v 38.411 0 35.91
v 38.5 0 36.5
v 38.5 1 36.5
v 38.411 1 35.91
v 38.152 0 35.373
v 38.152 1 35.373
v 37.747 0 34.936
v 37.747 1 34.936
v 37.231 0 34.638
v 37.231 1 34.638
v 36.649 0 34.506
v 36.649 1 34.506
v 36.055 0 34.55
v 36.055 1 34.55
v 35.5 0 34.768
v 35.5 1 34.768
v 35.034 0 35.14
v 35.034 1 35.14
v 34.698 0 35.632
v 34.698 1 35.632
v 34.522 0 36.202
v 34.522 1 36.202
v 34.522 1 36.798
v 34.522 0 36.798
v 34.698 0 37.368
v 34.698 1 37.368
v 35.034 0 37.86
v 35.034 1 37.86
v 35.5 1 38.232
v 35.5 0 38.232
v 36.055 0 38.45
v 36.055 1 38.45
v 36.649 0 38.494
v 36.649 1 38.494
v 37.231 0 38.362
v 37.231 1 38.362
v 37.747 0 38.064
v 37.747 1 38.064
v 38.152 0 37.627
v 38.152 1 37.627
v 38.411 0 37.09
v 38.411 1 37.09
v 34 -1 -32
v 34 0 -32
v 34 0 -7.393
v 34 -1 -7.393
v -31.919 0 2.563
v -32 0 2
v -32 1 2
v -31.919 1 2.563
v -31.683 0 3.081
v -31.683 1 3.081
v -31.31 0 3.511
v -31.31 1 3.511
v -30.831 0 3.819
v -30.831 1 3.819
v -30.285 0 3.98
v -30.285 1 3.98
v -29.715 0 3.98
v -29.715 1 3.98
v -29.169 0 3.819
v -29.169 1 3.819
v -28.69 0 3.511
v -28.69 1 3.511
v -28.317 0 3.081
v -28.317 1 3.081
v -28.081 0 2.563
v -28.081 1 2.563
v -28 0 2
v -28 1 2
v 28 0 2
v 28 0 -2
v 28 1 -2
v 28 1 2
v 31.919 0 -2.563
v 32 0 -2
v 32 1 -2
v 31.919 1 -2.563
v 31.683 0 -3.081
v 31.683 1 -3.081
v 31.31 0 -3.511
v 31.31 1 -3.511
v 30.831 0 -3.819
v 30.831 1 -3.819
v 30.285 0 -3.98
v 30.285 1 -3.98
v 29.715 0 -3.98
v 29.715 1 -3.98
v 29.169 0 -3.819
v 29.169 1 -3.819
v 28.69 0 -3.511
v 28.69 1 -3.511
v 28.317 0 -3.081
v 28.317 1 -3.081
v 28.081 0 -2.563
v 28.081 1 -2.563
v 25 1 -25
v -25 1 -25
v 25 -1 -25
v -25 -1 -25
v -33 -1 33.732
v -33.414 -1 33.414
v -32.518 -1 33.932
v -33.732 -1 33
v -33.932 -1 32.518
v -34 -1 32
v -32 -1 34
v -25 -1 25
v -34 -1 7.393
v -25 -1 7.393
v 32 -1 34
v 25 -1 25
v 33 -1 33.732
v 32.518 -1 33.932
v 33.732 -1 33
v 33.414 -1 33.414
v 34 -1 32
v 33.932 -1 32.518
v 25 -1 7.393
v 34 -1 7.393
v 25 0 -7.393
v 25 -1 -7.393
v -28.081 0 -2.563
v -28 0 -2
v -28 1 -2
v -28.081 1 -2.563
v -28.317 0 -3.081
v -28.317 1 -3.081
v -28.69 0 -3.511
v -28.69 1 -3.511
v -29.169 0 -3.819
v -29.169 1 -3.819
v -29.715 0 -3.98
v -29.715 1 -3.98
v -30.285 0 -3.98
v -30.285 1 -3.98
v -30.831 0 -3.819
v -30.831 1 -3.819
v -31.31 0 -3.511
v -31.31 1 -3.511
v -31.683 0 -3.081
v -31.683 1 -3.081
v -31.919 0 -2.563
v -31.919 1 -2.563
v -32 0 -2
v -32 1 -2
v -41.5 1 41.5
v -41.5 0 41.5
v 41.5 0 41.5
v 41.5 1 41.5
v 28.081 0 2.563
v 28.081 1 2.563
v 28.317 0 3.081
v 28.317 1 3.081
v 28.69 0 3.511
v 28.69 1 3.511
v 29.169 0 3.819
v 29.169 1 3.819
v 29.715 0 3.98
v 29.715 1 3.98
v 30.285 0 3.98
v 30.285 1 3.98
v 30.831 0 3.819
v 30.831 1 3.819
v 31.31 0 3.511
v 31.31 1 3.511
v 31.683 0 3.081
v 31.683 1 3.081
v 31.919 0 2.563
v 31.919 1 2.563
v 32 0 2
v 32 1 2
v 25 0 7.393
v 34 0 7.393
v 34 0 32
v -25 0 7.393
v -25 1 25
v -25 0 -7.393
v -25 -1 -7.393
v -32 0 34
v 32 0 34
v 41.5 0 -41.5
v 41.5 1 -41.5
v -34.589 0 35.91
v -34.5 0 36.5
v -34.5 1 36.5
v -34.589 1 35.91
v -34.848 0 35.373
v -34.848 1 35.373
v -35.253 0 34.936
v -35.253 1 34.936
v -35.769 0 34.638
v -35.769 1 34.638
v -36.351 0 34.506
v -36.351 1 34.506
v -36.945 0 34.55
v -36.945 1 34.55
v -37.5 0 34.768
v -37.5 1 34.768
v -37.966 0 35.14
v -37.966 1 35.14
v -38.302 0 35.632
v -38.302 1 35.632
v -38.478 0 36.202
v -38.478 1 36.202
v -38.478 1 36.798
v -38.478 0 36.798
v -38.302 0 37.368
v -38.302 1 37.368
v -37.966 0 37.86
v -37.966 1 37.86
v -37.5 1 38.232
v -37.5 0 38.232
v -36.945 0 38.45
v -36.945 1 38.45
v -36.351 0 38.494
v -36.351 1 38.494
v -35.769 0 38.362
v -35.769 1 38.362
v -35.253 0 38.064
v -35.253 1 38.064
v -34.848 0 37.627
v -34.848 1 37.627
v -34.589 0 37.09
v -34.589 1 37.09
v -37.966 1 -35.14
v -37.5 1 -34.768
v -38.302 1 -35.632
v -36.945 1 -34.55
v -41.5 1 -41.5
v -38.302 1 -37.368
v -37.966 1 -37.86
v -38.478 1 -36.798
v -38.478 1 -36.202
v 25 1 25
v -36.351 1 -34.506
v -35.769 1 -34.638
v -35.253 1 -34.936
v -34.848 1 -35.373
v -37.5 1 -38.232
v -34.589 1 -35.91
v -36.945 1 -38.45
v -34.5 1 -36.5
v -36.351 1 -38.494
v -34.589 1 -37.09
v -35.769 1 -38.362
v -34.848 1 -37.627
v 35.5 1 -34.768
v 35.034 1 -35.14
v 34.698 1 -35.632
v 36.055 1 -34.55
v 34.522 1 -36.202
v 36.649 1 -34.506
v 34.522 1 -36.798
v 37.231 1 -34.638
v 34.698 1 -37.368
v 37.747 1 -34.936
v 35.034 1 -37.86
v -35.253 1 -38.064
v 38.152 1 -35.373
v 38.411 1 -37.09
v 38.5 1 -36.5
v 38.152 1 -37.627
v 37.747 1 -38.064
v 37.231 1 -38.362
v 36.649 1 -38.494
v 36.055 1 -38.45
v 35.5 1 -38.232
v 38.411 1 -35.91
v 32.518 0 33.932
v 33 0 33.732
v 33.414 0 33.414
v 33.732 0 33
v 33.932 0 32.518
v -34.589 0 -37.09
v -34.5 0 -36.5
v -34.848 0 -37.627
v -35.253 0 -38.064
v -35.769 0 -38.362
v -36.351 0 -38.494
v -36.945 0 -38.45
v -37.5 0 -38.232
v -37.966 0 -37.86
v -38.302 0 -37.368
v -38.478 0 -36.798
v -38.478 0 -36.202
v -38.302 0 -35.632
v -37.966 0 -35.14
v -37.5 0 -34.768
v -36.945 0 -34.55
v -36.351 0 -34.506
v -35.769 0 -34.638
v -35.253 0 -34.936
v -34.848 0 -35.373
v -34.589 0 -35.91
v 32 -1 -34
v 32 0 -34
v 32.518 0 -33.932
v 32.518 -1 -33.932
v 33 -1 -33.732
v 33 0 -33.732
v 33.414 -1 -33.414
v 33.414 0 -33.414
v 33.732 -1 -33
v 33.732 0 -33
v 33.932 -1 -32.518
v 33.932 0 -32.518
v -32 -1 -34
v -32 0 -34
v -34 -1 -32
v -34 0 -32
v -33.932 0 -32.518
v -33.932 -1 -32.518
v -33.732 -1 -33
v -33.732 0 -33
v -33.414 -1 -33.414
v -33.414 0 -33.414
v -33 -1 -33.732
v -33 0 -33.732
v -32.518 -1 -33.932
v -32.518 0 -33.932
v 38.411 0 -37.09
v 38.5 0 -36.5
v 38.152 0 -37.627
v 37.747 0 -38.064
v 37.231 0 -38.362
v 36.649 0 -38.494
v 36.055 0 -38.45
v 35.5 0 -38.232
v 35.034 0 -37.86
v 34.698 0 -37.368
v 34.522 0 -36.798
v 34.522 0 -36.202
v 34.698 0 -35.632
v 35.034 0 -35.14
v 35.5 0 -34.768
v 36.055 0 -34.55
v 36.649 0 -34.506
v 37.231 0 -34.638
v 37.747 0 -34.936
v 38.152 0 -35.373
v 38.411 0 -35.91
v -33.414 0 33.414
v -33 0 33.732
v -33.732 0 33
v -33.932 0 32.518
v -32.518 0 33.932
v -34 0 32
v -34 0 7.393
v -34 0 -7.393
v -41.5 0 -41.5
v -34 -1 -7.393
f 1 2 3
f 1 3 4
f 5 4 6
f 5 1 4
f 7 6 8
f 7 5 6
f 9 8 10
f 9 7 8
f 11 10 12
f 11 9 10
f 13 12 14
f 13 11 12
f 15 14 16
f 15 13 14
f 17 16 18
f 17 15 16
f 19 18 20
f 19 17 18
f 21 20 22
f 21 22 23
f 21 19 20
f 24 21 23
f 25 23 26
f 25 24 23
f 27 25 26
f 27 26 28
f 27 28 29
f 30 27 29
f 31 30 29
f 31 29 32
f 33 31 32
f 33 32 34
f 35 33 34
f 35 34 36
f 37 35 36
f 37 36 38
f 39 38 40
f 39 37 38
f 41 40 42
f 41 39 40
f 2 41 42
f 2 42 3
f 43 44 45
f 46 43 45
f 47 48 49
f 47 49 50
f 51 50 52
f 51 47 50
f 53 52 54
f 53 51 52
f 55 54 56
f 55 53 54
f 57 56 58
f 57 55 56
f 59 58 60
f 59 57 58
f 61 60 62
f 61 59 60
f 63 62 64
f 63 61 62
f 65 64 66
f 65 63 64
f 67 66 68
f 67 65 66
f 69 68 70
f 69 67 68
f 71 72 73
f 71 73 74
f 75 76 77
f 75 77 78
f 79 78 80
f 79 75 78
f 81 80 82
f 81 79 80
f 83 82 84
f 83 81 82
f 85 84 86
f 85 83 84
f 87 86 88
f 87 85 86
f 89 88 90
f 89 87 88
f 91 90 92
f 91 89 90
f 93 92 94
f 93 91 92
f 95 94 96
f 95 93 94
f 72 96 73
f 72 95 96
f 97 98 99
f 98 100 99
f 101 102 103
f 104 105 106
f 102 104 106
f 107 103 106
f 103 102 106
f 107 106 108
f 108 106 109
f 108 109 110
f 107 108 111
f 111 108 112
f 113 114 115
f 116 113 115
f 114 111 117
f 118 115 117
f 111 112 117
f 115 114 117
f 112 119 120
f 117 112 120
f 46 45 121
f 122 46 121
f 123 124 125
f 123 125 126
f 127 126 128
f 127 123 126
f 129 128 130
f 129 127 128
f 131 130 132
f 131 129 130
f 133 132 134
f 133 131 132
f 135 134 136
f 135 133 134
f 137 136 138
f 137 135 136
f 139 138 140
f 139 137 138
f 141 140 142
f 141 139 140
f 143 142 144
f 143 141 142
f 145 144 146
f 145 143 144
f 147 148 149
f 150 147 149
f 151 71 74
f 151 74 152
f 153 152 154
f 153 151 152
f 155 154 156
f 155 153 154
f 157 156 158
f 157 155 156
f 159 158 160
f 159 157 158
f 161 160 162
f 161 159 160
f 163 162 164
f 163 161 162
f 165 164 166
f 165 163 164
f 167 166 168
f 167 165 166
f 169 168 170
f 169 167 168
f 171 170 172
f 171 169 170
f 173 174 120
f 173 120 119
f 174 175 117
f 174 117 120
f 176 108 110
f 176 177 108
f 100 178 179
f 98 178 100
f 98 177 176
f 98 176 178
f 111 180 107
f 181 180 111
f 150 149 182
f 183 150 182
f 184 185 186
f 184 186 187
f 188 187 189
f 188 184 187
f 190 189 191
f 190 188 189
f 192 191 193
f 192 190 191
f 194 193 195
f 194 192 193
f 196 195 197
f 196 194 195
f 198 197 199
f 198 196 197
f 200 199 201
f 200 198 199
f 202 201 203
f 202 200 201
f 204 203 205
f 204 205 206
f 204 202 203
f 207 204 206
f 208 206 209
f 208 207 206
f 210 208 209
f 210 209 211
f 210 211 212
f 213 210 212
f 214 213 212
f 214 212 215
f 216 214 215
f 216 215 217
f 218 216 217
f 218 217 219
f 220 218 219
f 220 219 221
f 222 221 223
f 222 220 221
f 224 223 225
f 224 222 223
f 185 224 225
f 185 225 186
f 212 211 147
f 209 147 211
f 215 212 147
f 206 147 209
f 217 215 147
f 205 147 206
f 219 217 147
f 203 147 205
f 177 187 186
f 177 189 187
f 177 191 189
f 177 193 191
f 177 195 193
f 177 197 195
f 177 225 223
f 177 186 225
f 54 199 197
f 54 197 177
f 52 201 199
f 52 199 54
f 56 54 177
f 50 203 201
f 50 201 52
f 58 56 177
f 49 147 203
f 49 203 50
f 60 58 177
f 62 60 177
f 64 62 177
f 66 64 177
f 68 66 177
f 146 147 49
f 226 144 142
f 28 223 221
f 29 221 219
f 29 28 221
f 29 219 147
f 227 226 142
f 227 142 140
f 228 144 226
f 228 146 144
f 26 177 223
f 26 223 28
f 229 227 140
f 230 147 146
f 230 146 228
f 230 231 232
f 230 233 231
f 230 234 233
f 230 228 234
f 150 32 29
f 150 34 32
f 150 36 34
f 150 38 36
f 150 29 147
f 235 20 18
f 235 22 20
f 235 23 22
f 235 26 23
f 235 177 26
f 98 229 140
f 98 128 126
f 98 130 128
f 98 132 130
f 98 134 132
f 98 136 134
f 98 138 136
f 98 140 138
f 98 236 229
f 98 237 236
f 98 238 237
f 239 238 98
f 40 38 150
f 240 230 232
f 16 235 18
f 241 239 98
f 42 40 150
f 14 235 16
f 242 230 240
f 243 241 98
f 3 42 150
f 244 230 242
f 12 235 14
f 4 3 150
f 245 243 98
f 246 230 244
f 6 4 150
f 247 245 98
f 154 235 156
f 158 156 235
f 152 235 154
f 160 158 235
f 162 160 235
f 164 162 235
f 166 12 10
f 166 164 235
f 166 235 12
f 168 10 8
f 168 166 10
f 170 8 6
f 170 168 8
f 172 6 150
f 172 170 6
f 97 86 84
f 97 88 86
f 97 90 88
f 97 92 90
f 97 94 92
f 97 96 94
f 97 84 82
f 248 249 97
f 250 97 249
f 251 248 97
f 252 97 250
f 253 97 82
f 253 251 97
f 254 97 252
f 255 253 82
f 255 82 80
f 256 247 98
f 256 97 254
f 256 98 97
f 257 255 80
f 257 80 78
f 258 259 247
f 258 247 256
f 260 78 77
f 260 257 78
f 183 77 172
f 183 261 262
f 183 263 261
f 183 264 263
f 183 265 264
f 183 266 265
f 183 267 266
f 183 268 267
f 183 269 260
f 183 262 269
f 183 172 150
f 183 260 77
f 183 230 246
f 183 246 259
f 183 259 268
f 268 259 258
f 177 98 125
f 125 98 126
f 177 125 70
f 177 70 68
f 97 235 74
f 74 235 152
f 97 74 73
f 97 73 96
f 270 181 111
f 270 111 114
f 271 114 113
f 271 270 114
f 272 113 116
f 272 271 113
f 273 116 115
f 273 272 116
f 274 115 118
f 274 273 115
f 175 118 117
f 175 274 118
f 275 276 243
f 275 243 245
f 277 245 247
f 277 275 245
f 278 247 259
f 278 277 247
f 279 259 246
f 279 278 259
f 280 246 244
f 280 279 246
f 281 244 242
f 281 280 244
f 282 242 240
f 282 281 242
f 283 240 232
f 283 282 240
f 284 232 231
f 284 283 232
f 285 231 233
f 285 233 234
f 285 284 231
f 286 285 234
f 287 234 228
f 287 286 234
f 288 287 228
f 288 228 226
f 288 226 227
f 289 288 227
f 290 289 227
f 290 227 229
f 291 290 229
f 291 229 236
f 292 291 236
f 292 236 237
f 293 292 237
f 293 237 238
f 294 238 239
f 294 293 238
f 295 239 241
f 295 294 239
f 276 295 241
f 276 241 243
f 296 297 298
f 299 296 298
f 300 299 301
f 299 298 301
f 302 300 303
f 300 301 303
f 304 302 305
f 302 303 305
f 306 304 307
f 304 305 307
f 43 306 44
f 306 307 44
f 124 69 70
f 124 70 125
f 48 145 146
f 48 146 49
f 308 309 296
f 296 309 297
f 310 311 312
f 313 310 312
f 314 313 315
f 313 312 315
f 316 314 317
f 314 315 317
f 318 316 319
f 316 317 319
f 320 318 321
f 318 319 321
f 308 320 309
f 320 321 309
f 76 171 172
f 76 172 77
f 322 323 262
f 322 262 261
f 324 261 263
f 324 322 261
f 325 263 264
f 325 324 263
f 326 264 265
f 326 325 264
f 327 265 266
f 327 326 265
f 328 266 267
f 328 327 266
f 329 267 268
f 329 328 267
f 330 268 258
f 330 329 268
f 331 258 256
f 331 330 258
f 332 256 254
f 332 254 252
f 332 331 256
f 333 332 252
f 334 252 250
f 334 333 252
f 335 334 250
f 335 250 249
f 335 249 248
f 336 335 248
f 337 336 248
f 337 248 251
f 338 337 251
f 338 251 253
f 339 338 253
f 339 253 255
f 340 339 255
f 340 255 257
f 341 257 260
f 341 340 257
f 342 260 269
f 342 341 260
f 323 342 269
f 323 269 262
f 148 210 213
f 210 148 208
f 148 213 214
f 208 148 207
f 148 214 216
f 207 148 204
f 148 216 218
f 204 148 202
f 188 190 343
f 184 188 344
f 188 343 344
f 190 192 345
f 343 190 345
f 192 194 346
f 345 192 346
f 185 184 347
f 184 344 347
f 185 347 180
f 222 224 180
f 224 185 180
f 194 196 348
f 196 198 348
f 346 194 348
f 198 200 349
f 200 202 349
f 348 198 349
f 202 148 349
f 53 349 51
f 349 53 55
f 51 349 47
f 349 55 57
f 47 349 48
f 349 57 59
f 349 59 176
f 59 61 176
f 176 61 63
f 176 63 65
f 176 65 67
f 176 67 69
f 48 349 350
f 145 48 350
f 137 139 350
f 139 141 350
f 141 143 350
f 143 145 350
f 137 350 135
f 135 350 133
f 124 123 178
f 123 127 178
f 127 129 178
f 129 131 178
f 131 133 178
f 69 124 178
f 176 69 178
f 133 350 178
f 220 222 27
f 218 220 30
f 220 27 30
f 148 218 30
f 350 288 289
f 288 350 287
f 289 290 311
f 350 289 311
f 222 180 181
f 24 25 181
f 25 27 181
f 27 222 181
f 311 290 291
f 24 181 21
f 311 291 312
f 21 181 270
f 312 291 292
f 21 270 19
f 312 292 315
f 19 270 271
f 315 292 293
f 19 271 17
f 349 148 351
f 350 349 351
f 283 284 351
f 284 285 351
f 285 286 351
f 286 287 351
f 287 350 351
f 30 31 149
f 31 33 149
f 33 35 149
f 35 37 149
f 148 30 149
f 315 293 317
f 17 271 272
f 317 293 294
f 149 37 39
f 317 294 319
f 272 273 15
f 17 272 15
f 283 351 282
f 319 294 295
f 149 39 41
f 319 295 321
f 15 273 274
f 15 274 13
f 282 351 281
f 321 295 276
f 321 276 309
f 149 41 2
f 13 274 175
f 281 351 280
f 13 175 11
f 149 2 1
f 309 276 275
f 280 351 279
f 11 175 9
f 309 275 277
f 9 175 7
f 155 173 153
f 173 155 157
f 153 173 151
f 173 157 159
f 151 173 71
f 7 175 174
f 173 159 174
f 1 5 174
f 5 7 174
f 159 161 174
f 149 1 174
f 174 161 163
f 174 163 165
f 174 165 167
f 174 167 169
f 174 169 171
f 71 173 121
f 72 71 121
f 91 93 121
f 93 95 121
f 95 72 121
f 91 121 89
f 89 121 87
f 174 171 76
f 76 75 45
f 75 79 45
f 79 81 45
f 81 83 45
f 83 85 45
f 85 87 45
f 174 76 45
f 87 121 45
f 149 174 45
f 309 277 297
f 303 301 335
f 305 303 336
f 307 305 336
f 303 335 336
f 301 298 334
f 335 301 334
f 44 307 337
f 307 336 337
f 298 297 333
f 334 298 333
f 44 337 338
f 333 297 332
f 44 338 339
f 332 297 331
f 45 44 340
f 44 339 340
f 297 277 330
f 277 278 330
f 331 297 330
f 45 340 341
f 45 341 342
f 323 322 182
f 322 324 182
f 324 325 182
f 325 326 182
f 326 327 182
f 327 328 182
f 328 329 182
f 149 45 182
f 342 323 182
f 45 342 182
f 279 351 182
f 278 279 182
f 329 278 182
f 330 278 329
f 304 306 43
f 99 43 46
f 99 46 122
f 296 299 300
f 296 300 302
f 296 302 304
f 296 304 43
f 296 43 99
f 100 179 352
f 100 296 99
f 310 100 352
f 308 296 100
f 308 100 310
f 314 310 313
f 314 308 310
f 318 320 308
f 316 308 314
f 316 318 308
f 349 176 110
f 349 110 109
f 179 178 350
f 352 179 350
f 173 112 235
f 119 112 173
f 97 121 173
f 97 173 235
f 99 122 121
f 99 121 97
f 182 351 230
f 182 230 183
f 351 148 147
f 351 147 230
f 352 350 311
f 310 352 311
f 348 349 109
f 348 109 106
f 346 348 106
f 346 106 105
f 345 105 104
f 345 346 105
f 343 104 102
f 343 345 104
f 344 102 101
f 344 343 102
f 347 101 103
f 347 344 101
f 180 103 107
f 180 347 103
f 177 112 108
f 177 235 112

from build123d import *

# Parameters (mm, degrees)
SKETCH_1_W      = 83
SKETCH_1_H      = 83
SKETCH_1_R      = 2
SKETCH_1_W_2    = 50
SKETCH_1_H_2    = 50
EXTRUDE_1_DEPTH = 1
EXTRUDE_2_DEPTH = 1


with BuildPart() as part:
    # Эскиз1 → Бобышка-Вытянуть1 (new body)
    with BuildSketch(Plane(origin=(0, 0, 0), x_dir=(1, 0, 0), z_dir=(0, 1, 0))):
        Rectangle(SKETCH_1_W, SKETCH_1_H)
        with Locations((36.5, 36.5)):
            Circle(SKETCH_1_R, mode=Mode.SUBTRACT)
        with Locations((-36.5, 36.5)):
            Circle(SKETCH_1_R, mode=Mode.SUBTRACT)
        with Locations((-36.5, -36.5)):
            Circle(SKETCH_1_R, mode=Mode.SUBTRACT)
        with Locations((36.5, -36.5)):
            Circle(SKETCH_1_R, mode=Mode.SUBTRACT)
        with BuildLine():
            Line((28, 2), (28, -2))
            ThreePointArc((28, -2), (30, -4), (32, -2))
            Line((32, -2), (32, 2))
            ThreePointArc((32, 2), (30, 4), (28, 2))
        make_face(mode=Mode.SUBTRACT)
        Rectangle(SKETCH_1_W_2, SKETCH_1_H_2, mode=Mode.SUBTRACT)
        with BuildLine():
            Line((-32, 2), (-32, -2))
            ThreePointArc((-32, -2), (-30, -4), (-28, -2))
            Line((-28, -2), (-28, 2))
            ThreePointArc((-28, 2), (-30, 4), (-32, 2))
        make_face(mode=Mode.SUBTRACT)
    extrude(amount=EXTRUDE_1_DEPTH)

    # Эскиз2 → Бобышка-Вытянуть2 (add)
    with BuildSketch(Plane(origin=(0, 0, 0), x_dir=(1, 0, 0), z_dir=(0, 1, 0))):
        with BuildLine():
            Line((-25, -7.393137128), (-34, -7.393137128))
            Line((-34, -7.393137128), (-34, -32))
            ThreePointArc((-34, -32), (-33.414213562, -33.414213562), (-32, -34))
            Line((-32, -34), (32, -34))
            ThreePointArc((32, -34), (33.414213562, -33.414213562), (34, -32))
            Line((34, -32), (34, -7.393137128))
            Line((34, -7.393137128), (25, -7.393137128))
            Line((25, -7.393137128), (25, -25))
            Line((25, -25), (-25, -25))
            Line((-25, -25), (-25, -7.393137128))
        make_face()
        with BuildLine():
            Line((-25, 25), (-25, 7.393137128))
            Line((-25, 7.393137128), (-34, 7.393137128))
            Line((-34, 7.393137128), (-34, 32))
            ThreePointArc((-34, 32), (-33.414213562, 33.414213562), (-32, 34))
            Line((-32, 34), (32, 34))
            ThreePointArc((32, 34), (33.414213562, 33.414213562), (34, 32))
            Line((34, 32), (34, 7.393137128))
            Line((34, 7.393137128), (25, 7.393137128))
            Line((25, 7.393137128), (25, 25))
            Line((25, 25), (-25, 25))
        make_face()
    extrude(amount=-EXTRUDE_2_DEPTH)


solid = part.part
